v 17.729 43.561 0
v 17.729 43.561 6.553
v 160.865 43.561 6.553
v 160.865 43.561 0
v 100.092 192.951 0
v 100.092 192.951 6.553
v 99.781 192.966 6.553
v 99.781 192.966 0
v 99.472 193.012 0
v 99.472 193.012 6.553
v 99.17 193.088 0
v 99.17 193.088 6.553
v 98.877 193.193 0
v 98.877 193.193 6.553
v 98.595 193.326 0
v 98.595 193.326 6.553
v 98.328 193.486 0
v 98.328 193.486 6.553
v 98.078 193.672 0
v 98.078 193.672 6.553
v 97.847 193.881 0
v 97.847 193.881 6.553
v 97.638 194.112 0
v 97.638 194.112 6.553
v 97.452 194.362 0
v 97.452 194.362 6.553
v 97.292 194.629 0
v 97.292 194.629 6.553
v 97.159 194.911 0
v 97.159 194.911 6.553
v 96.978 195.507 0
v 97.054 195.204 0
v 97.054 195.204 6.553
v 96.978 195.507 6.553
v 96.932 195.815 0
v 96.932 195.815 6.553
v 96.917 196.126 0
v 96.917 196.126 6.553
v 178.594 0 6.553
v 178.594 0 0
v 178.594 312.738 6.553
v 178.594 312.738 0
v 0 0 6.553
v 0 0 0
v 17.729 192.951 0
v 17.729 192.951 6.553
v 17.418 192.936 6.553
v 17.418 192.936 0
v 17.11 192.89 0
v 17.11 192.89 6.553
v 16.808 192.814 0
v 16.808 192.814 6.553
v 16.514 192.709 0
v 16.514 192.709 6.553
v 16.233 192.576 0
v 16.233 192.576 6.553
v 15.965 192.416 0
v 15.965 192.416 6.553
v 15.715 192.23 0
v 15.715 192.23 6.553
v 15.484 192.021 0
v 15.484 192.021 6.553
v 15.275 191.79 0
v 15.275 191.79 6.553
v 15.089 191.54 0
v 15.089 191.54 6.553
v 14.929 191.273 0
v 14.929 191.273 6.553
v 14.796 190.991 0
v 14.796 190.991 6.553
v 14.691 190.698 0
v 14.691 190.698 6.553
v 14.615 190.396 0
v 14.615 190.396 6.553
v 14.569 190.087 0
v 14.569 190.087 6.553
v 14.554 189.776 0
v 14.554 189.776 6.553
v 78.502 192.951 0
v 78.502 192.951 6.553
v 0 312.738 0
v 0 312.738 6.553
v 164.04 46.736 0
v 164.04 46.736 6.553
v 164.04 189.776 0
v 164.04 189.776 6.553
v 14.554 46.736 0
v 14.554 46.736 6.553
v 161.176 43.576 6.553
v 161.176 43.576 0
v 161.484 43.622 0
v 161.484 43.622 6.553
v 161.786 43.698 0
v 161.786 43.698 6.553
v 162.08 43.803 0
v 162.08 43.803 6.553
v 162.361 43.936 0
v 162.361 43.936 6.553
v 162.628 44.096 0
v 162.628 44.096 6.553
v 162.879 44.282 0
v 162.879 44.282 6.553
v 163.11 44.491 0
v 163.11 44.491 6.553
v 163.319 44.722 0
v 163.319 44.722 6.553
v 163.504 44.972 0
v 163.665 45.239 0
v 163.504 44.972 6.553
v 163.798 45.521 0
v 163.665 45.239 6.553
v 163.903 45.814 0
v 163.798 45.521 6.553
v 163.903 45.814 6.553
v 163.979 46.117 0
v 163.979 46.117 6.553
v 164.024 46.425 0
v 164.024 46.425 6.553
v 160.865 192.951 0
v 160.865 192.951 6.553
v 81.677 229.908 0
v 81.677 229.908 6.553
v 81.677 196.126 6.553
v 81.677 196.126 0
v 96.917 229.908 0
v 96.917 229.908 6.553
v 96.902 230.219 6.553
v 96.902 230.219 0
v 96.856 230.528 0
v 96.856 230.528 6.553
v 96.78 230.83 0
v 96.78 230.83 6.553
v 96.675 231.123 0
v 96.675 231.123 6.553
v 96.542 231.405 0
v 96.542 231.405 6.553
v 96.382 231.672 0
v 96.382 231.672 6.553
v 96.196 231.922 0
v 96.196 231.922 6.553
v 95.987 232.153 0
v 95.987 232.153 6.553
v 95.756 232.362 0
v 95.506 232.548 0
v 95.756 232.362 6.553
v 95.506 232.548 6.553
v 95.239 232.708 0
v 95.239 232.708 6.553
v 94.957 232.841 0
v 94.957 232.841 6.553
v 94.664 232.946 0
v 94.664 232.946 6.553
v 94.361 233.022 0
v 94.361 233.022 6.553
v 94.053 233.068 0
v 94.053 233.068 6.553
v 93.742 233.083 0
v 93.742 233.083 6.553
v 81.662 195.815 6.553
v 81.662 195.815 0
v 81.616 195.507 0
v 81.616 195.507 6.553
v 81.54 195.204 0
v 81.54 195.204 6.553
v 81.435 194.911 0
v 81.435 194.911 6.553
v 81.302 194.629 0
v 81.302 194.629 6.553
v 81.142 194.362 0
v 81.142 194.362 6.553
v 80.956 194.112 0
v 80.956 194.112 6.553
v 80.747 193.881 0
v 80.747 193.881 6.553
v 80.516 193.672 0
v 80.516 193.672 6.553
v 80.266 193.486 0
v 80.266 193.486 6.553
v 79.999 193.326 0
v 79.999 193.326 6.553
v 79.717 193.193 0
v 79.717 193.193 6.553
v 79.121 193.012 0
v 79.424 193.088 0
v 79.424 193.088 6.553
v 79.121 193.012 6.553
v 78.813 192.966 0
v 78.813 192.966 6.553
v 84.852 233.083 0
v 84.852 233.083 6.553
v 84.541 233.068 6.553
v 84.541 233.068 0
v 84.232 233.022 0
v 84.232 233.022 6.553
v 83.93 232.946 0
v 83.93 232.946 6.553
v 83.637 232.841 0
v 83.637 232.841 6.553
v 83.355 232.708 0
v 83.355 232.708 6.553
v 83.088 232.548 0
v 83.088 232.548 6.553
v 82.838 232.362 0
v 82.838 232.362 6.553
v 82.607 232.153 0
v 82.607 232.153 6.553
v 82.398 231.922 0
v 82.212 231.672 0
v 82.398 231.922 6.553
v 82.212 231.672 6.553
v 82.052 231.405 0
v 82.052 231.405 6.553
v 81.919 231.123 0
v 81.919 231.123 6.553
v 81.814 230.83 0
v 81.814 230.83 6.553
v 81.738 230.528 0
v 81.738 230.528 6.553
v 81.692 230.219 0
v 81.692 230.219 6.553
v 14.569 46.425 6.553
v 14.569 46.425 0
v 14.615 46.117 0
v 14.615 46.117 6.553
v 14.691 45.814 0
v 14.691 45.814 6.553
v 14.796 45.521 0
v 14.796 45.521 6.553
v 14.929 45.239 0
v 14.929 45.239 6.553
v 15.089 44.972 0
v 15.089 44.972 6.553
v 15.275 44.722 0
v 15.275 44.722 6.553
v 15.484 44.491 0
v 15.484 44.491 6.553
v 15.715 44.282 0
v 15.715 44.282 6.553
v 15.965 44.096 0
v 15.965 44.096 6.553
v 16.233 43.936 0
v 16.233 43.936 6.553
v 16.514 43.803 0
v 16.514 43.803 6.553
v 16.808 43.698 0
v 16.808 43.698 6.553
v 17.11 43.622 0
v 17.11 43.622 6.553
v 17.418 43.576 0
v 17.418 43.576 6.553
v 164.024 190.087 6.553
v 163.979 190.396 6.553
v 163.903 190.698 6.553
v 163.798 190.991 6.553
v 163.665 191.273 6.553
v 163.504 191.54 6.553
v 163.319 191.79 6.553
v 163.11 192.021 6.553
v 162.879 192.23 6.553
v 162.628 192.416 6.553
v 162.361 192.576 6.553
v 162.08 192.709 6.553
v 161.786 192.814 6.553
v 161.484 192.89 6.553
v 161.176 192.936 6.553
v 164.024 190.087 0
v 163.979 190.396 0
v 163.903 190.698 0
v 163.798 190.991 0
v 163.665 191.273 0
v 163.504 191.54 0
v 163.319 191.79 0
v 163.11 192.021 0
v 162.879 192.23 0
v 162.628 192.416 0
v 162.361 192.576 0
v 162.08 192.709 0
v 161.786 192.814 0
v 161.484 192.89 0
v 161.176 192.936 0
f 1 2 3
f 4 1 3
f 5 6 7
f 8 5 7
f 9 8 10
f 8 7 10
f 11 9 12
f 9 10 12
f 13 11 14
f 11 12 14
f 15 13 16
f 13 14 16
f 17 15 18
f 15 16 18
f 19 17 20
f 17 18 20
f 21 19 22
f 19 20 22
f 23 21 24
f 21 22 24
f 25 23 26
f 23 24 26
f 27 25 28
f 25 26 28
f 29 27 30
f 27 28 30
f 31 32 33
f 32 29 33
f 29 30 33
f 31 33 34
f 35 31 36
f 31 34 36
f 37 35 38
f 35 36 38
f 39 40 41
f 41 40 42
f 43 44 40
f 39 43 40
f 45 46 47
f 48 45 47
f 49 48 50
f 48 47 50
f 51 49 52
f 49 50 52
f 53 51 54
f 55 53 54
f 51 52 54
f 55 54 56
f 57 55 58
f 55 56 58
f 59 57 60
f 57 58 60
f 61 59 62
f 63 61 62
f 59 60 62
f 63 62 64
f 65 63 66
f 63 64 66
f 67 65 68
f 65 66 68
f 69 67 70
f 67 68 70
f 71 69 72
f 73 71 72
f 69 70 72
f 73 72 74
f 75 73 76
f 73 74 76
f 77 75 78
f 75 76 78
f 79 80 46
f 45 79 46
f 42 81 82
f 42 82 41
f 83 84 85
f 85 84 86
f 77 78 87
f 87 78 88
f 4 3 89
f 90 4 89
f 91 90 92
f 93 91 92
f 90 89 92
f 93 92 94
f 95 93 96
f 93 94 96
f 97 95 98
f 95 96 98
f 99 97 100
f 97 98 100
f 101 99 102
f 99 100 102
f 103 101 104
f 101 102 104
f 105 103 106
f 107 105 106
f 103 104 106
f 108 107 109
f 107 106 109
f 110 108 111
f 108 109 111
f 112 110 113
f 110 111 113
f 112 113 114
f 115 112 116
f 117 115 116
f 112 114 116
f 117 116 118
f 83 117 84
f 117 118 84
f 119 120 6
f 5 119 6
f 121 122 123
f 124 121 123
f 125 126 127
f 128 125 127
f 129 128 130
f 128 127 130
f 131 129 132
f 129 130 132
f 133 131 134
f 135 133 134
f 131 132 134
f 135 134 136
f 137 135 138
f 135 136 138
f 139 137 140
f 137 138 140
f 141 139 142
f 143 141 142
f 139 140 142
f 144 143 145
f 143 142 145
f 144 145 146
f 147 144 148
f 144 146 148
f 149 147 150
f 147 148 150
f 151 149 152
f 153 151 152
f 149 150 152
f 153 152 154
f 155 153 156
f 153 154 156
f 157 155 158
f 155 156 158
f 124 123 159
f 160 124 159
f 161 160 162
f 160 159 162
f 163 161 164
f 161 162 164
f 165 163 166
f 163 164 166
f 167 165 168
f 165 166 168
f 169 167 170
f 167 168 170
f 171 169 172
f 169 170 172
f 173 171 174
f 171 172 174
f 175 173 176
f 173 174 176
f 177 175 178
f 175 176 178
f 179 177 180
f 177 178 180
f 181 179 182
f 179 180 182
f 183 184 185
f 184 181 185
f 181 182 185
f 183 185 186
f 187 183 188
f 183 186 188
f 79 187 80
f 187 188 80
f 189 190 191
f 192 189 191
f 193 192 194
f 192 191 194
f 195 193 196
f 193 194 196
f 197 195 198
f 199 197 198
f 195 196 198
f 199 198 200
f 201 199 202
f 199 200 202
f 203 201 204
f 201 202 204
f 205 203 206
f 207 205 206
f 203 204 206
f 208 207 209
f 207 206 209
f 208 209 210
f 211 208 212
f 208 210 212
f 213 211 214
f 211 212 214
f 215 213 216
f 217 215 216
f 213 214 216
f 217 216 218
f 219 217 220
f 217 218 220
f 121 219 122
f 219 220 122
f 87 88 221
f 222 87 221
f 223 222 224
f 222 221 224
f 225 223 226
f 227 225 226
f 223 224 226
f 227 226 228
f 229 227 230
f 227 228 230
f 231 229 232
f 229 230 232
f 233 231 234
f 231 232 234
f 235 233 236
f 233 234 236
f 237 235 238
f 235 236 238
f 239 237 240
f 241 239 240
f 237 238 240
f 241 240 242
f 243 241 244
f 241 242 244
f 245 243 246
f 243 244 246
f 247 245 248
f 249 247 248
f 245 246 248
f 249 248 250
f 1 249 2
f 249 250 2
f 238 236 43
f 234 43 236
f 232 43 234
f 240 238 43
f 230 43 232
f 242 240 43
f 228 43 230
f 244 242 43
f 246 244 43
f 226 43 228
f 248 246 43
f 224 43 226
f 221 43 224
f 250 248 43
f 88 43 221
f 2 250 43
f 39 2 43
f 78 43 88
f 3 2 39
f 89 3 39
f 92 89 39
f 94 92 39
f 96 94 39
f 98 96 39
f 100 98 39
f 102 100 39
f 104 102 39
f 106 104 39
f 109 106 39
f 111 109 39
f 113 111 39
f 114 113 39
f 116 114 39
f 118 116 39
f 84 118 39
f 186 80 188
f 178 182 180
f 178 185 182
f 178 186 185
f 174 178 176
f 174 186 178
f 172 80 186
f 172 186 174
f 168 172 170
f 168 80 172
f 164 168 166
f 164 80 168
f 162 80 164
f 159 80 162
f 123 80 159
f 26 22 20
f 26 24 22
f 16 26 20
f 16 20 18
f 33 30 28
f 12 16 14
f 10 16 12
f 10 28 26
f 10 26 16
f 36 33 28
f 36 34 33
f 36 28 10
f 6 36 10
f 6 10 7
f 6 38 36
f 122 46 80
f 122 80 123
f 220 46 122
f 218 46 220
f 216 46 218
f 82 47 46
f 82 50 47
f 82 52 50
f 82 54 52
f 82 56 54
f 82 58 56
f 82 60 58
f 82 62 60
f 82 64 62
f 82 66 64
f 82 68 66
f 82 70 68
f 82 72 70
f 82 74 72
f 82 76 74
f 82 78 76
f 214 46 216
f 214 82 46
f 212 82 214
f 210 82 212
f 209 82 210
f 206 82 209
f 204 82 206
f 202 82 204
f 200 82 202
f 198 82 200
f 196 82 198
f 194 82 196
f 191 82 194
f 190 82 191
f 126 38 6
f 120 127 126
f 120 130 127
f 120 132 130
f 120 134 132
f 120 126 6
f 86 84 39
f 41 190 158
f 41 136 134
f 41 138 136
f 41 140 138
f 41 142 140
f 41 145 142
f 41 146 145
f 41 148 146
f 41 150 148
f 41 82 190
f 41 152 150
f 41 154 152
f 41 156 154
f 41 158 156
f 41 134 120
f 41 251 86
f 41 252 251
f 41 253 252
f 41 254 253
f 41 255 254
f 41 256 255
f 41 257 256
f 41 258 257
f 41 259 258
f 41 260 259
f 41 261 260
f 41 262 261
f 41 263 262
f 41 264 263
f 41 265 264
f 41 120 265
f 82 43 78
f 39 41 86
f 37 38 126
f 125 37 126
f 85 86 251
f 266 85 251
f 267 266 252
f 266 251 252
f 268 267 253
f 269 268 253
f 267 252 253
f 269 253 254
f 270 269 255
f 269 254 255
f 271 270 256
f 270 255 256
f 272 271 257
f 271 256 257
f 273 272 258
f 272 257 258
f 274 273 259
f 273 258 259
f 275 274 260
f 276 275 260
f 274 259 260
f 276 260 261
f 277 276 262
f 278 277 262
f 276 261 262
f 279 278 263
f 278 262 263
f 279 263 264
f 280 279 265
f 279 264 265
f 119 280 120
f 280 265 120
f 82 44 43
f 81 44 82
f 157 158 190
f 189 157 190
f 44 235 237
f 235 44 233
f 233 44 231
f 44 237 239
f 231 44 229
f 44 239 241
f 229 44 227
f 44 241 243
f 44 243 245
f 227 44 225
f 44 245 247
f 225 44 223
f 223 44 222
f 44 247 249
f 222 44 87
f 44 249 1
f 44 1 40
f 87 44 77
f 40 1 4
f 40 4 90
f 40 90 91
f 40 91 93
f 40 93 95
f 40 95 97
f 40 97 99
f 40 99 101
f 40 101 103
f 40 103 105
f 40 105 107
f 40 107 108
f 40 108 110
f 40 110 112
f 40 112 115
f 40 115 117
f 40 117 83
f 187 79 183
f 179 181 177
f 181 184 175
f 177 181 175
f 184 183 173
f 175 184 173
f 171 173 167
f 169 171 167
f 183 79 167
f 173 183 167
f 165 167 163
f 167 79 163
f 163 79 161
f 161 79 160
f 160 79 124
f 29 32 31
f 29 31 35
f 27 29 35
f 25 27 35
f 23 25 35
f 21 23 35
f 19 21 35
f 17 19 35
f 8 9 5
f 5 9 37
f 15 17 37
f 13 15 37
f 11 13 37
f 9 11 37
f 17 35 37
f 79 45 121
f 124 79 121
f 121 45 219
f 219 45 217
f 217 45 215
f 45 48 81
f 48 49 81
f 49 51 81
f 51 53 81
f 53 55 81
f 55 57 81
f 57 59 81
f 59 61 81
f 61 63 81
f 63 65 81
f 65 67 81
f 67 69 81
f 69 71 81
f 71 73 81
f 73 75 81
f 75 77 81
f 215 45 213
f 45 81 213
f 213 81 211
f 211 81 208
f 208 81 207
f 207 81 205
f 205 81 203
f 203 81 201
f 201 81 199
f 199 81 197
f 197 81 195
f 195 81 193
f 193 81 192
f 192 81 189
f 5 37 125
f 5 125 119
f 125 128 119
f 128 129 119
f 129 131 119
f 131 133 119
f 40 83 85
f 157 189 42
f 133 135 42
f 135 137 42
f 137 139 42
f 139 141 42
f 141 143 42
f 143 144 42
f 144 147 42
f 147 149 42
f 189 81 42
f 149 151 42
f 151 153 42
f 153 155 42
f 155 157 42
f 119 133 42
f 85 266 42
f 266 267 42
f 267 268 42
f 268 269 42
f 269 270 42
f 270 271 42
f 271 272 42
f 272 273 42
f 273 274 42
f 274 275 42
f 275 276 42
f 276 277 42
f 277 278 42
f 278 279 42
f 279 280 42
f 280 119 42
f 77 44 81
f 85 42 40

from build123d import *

# Parameters (mm, degrees)
F0_W     = 178.59375
F0_H     = 312.7375
F1_DEPTH = 6.5532
F3_DEPTH = 25.4


with BuildPart() as f1:
    # F0 (on Top) → F1 (new body)
    with BuildSketch(Plane.XY):
        with Locations((89.296875, 156.36875)):
            Rectangle(F0_W, F0_H)
    extrude(amount=F1_DEPTH)

    # F2 (on face) → F3 (cut)
    with BuildSketch(Plane.XY.offset(6.5532)):
        with BuildLine():
            Line((78.501875, 192.9511), (17.7292, 192.9511))
            ThreePointArc((17.7292, 192.9511), (15.484136, 192.021164), (14.5542, 189.7761))
            Line((14.5542, 189.7761), (14.5542, 46.736))
            ThreePointArc((14.5542, 46.736), (15.484136, 44.490936), (17.7292, 43.561))
            Line((17.7292, 43.561), (160.86455, 43.561))
            ThreePointArc((160.86455, 43.561), (163.109614, 44.490936), (164.03955, 46.736))
            Line((164.03955, 46.736), (164.03955, 189.7761))
            ThreePointArc((164.03955, 189.7761), (163.109614, 192.021164), (160.86455, 192.9511))
            Line((160.86455, 192.9511), (100.091875, 192.9511))
            ThreePointArc((100.091875, 192.9511), (97.846811, 193.881036), (96.916875, 196.1261))
            Line((96.916875, 196.1261), (96.916875, 229.9081))
            ThreePointArc((96.916875, 229.9081), (95.986939, 232.153164), (93.741875, 233.0831))
            Line((93.741875, 233.0831), (84.851875, 233.0831))
            ThreePointArc((84.851875, 233.0831), (82.606811, 232.153164), (81.676875, 229.9081))
            Line((81.676875, 229.9081), (81.676875, 196.1261))
            ThreePointArc((81.676875, 196.1261), (80.746939, 193.881036), (78.501875, 192.9511))
        make_face()
    extrude(amount=-F3_DEPTH, mode=Mode.SUBTRACT)


solid = f1.part
